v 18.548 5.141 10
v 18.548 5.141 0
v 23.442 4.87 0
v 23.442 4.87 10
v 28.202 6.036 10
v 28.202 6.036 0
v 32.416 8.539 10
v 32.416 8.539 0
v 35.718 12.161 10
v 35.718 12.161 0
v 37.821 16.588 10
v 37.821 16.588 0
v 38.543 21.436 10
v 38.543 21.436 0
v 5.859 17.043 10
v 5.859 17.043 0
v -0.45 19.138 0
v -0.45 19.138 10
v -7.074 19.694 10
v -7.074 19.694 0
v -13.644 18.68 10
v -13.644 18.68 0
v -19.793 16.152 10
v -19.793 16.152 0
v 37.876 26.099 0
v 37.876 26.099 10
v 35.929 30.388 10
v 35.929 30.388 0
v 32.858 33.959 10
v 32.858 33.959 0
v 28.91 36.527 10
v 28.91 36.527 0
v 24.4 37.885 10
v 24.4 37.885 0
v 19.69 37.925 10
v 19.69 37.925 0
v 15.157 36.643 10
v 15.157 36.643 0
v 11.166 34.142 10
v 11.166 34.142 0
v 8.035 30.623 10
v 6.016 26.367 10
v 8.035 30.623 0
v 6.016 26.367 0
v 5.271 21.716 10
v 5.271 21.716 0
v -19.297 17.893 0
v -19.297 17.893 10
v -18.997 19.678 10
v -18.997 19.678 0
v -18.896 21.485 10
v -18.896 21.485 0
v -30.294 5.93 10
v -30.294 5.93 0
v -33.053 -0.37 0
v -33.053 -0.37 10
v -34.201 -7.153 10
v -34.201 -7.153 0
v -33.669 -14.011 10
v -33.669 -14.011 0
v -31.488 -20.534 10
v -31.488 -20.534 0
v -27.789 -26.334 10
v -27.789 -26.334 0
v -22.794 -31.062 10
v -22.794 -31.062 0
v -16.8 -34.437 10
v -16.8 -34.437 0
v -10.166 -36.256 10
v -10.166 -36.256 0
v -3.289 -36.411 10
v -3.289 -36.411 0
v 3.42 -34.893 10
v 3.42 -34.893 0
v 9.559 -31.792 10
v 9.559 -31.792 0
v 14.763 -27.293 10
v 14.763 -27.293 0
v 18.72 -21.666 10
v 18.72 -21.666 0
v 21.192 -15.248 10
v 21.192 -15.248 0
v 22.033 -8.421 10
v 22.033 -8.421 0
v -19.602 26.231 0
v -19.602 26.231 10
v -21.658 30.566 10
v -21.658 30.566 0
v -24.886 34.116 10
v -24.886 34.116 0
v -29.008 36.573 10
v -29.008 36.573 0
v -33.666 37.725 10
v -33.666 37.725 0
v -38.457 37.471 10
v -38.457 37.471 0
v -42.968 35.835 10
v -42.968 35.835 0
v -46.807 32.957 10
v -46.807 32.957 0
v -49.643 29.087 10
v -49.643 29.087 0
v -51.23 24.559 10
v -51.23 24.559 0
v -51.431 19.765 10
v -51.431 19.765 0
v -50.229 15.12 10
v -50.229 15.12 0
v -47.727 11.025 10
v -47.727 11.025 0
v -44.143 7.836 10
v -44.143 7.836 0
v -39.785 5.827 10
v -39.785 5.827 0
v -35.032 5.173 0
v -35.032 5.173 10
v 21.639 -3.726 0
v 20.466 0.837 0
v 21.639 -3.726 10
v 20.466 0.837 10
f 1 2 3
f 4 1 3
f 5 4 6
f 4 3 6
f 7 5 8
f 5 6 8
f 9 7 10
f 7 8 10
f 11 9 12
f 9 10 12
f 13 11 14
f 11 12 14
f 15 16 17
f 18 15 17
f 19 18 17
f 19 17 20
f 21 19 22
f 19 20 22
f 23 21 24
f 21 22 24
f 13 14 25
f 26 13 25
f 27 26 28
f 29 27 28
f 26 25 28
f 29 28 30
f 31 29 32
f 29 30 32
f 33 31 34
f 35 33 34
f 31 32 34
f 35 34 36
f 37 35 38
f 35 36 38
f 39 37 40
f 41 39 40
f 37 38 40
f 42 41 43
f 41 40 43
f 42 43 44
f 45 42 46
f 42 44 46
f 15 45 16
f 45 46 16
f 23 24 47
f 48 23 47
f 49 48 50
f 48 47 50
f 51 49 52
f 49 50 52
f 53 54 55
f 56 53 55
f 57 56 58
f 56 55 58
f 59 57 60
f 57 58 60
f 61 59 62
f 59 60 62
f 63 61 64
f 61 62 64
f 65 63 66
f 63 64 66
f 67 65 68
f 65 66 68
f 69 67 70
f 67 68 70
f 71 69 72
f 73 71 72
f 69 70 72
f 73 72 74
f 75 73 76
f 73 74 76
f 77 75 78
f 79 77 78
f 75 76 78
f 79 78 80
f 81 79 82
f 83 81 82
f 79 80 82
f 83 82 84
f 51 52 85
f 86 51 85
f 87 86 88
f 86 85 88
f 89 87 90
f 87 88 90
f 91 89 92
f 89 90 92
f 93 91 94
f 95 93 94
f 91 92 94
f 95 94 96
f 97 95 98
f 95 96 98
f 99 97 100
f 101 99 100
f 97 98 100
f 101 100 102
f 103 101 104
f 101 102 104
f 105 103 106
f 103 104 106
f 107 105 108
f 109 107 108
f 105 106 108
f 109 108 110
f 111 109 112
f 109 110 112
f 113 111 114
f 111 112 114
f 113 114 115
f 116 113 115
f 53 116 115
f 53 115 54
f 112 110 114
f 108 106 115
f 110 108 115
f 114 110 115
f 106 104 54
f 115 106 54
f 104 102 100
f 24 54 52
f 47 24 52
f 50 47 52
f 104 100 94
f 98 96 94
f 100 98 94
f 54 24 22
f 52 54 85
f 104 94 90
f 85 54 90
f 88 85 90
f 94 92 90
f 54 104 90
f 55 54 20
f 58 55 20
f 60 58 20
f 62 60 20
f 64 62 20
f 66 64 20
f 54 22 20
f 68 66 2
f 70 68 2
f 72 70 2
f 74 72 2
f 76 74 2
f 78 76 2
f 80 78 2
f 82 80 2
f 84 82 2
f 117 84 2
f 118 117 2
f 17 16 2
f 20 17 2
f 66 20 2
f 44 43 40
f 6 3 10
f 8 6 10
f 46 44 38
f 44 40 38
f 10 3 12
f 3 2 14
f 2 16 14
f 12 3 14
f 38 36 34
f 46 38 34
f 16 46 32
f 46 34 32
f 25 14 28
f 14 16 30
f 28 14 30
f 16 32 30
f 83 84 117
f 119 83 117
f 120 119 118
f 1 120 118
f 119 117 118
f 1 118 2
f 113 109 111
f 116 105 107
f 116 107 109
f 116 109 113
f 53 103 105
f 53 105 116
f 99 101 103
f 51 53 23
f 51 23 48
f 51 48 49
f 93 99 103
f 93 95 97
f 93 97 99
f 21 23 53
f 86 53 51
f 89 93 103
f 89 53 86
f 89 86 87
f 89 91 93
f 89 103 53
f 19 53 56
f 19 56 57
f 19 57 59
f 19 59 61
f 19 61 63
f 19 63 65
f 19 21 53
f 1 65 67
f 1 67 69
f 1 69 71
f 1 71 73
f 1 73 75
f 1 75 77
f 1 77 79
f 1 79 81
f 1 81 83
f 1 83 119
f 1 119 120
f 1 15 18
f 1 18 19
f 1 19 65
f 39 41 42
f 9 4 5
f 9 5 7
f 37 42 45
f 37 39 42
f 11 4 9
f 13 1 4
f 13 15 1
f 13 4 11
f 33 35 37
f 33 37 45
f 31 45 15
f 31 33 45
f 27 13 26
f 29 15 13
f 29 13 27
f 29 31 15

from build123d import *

# Parameters (mm, degrees)
F1_DEPTH = 10


with BuildPart() as f1:
    # F0 (on Top) → F1 (new body)
    with BuildSketch(Plane.XY):
        with BuildLine():
            ThreePointArc((-30.293809798, 5.9303317262), (-13.5387489786, -35.5502092603), (22.0330680191, -8.4206464354))
            ThreePointArc((22.0330680191, -8.4206464354), (21.1479502751, -1.419524921), (18.5482952641, 5.1410337217))
            ThreePointArc((18.5482952641, 5.1410337217), (10.523993366, 9.3012075006), (5.8590515306, 17.0429634058))
            ThreePointArc((5.8590515306, 17.0429634058), (-7.074281312, 19.6937803671), (-19.792655595, 16.1524692286))
            ThreePointArc((-19.792655595, 16.1524692286), (-23.8307305262, 9.7958026502), (-30.293809798, 5.9303317262))
        make_face()
        with BuildLine():
            ThreePointArc((5.8590515306, 17.0429634058), (10.523993366, 9.3012075006), (18.5482952641, 5.1410337217))
            ThreePointArc((18.5482952641, 5.1410337217), (13.146861043, 12.0975781831), (5.8590515306, 17.0429634058))
        make_face()
        with BuildLine():
            ThreePointArc((5.8590515306, 17.0429634058), (13.146861043, 12.0975781831), (18.5482952641, 5.1410337217))
            ThreePointArc((18.5482952641, 5.1410337217), (32.4160701368, 8.5391186206), (38.5428073237, 21.4358334092))
            ThreePointArc((38.5428073237, 21.4358334092), (19.6895316542, 37.9246568937), (5.8590515306, 17.0429634058))
        make_face()
        with BuildLine():
            ThreePointArc((-18.8964610276, 21.484998477), (-48.3679268886, 31.1266686737), (-30.293809798, 5.9303317262))
            ThreePointArc((-30.293809798, 5.9303317262), (-25.7205702793, 11.7372262186), (-19.792655595, 16.1524692286))
            ThreePointArc((-19.792655595, 16.1524692286), (-19.1220697647, 18.7813420229), (-18.8964610276, 21.484998477))
        make_face()
        with BuildLine():
            ThreePointArc((-19.792655595, 16.1524692286), (-25.7205702793, 11.7372262186), (-30.293809798, 5.9303317262))
            ThreePointArc((-30.293809798, 5.9303317262), (-23.8307305262, 9.7958026502), (-19.792655595, 16.1524692286))
        make_face()
    extrude(amount=F1_DEPTH)


solid = f1.part
